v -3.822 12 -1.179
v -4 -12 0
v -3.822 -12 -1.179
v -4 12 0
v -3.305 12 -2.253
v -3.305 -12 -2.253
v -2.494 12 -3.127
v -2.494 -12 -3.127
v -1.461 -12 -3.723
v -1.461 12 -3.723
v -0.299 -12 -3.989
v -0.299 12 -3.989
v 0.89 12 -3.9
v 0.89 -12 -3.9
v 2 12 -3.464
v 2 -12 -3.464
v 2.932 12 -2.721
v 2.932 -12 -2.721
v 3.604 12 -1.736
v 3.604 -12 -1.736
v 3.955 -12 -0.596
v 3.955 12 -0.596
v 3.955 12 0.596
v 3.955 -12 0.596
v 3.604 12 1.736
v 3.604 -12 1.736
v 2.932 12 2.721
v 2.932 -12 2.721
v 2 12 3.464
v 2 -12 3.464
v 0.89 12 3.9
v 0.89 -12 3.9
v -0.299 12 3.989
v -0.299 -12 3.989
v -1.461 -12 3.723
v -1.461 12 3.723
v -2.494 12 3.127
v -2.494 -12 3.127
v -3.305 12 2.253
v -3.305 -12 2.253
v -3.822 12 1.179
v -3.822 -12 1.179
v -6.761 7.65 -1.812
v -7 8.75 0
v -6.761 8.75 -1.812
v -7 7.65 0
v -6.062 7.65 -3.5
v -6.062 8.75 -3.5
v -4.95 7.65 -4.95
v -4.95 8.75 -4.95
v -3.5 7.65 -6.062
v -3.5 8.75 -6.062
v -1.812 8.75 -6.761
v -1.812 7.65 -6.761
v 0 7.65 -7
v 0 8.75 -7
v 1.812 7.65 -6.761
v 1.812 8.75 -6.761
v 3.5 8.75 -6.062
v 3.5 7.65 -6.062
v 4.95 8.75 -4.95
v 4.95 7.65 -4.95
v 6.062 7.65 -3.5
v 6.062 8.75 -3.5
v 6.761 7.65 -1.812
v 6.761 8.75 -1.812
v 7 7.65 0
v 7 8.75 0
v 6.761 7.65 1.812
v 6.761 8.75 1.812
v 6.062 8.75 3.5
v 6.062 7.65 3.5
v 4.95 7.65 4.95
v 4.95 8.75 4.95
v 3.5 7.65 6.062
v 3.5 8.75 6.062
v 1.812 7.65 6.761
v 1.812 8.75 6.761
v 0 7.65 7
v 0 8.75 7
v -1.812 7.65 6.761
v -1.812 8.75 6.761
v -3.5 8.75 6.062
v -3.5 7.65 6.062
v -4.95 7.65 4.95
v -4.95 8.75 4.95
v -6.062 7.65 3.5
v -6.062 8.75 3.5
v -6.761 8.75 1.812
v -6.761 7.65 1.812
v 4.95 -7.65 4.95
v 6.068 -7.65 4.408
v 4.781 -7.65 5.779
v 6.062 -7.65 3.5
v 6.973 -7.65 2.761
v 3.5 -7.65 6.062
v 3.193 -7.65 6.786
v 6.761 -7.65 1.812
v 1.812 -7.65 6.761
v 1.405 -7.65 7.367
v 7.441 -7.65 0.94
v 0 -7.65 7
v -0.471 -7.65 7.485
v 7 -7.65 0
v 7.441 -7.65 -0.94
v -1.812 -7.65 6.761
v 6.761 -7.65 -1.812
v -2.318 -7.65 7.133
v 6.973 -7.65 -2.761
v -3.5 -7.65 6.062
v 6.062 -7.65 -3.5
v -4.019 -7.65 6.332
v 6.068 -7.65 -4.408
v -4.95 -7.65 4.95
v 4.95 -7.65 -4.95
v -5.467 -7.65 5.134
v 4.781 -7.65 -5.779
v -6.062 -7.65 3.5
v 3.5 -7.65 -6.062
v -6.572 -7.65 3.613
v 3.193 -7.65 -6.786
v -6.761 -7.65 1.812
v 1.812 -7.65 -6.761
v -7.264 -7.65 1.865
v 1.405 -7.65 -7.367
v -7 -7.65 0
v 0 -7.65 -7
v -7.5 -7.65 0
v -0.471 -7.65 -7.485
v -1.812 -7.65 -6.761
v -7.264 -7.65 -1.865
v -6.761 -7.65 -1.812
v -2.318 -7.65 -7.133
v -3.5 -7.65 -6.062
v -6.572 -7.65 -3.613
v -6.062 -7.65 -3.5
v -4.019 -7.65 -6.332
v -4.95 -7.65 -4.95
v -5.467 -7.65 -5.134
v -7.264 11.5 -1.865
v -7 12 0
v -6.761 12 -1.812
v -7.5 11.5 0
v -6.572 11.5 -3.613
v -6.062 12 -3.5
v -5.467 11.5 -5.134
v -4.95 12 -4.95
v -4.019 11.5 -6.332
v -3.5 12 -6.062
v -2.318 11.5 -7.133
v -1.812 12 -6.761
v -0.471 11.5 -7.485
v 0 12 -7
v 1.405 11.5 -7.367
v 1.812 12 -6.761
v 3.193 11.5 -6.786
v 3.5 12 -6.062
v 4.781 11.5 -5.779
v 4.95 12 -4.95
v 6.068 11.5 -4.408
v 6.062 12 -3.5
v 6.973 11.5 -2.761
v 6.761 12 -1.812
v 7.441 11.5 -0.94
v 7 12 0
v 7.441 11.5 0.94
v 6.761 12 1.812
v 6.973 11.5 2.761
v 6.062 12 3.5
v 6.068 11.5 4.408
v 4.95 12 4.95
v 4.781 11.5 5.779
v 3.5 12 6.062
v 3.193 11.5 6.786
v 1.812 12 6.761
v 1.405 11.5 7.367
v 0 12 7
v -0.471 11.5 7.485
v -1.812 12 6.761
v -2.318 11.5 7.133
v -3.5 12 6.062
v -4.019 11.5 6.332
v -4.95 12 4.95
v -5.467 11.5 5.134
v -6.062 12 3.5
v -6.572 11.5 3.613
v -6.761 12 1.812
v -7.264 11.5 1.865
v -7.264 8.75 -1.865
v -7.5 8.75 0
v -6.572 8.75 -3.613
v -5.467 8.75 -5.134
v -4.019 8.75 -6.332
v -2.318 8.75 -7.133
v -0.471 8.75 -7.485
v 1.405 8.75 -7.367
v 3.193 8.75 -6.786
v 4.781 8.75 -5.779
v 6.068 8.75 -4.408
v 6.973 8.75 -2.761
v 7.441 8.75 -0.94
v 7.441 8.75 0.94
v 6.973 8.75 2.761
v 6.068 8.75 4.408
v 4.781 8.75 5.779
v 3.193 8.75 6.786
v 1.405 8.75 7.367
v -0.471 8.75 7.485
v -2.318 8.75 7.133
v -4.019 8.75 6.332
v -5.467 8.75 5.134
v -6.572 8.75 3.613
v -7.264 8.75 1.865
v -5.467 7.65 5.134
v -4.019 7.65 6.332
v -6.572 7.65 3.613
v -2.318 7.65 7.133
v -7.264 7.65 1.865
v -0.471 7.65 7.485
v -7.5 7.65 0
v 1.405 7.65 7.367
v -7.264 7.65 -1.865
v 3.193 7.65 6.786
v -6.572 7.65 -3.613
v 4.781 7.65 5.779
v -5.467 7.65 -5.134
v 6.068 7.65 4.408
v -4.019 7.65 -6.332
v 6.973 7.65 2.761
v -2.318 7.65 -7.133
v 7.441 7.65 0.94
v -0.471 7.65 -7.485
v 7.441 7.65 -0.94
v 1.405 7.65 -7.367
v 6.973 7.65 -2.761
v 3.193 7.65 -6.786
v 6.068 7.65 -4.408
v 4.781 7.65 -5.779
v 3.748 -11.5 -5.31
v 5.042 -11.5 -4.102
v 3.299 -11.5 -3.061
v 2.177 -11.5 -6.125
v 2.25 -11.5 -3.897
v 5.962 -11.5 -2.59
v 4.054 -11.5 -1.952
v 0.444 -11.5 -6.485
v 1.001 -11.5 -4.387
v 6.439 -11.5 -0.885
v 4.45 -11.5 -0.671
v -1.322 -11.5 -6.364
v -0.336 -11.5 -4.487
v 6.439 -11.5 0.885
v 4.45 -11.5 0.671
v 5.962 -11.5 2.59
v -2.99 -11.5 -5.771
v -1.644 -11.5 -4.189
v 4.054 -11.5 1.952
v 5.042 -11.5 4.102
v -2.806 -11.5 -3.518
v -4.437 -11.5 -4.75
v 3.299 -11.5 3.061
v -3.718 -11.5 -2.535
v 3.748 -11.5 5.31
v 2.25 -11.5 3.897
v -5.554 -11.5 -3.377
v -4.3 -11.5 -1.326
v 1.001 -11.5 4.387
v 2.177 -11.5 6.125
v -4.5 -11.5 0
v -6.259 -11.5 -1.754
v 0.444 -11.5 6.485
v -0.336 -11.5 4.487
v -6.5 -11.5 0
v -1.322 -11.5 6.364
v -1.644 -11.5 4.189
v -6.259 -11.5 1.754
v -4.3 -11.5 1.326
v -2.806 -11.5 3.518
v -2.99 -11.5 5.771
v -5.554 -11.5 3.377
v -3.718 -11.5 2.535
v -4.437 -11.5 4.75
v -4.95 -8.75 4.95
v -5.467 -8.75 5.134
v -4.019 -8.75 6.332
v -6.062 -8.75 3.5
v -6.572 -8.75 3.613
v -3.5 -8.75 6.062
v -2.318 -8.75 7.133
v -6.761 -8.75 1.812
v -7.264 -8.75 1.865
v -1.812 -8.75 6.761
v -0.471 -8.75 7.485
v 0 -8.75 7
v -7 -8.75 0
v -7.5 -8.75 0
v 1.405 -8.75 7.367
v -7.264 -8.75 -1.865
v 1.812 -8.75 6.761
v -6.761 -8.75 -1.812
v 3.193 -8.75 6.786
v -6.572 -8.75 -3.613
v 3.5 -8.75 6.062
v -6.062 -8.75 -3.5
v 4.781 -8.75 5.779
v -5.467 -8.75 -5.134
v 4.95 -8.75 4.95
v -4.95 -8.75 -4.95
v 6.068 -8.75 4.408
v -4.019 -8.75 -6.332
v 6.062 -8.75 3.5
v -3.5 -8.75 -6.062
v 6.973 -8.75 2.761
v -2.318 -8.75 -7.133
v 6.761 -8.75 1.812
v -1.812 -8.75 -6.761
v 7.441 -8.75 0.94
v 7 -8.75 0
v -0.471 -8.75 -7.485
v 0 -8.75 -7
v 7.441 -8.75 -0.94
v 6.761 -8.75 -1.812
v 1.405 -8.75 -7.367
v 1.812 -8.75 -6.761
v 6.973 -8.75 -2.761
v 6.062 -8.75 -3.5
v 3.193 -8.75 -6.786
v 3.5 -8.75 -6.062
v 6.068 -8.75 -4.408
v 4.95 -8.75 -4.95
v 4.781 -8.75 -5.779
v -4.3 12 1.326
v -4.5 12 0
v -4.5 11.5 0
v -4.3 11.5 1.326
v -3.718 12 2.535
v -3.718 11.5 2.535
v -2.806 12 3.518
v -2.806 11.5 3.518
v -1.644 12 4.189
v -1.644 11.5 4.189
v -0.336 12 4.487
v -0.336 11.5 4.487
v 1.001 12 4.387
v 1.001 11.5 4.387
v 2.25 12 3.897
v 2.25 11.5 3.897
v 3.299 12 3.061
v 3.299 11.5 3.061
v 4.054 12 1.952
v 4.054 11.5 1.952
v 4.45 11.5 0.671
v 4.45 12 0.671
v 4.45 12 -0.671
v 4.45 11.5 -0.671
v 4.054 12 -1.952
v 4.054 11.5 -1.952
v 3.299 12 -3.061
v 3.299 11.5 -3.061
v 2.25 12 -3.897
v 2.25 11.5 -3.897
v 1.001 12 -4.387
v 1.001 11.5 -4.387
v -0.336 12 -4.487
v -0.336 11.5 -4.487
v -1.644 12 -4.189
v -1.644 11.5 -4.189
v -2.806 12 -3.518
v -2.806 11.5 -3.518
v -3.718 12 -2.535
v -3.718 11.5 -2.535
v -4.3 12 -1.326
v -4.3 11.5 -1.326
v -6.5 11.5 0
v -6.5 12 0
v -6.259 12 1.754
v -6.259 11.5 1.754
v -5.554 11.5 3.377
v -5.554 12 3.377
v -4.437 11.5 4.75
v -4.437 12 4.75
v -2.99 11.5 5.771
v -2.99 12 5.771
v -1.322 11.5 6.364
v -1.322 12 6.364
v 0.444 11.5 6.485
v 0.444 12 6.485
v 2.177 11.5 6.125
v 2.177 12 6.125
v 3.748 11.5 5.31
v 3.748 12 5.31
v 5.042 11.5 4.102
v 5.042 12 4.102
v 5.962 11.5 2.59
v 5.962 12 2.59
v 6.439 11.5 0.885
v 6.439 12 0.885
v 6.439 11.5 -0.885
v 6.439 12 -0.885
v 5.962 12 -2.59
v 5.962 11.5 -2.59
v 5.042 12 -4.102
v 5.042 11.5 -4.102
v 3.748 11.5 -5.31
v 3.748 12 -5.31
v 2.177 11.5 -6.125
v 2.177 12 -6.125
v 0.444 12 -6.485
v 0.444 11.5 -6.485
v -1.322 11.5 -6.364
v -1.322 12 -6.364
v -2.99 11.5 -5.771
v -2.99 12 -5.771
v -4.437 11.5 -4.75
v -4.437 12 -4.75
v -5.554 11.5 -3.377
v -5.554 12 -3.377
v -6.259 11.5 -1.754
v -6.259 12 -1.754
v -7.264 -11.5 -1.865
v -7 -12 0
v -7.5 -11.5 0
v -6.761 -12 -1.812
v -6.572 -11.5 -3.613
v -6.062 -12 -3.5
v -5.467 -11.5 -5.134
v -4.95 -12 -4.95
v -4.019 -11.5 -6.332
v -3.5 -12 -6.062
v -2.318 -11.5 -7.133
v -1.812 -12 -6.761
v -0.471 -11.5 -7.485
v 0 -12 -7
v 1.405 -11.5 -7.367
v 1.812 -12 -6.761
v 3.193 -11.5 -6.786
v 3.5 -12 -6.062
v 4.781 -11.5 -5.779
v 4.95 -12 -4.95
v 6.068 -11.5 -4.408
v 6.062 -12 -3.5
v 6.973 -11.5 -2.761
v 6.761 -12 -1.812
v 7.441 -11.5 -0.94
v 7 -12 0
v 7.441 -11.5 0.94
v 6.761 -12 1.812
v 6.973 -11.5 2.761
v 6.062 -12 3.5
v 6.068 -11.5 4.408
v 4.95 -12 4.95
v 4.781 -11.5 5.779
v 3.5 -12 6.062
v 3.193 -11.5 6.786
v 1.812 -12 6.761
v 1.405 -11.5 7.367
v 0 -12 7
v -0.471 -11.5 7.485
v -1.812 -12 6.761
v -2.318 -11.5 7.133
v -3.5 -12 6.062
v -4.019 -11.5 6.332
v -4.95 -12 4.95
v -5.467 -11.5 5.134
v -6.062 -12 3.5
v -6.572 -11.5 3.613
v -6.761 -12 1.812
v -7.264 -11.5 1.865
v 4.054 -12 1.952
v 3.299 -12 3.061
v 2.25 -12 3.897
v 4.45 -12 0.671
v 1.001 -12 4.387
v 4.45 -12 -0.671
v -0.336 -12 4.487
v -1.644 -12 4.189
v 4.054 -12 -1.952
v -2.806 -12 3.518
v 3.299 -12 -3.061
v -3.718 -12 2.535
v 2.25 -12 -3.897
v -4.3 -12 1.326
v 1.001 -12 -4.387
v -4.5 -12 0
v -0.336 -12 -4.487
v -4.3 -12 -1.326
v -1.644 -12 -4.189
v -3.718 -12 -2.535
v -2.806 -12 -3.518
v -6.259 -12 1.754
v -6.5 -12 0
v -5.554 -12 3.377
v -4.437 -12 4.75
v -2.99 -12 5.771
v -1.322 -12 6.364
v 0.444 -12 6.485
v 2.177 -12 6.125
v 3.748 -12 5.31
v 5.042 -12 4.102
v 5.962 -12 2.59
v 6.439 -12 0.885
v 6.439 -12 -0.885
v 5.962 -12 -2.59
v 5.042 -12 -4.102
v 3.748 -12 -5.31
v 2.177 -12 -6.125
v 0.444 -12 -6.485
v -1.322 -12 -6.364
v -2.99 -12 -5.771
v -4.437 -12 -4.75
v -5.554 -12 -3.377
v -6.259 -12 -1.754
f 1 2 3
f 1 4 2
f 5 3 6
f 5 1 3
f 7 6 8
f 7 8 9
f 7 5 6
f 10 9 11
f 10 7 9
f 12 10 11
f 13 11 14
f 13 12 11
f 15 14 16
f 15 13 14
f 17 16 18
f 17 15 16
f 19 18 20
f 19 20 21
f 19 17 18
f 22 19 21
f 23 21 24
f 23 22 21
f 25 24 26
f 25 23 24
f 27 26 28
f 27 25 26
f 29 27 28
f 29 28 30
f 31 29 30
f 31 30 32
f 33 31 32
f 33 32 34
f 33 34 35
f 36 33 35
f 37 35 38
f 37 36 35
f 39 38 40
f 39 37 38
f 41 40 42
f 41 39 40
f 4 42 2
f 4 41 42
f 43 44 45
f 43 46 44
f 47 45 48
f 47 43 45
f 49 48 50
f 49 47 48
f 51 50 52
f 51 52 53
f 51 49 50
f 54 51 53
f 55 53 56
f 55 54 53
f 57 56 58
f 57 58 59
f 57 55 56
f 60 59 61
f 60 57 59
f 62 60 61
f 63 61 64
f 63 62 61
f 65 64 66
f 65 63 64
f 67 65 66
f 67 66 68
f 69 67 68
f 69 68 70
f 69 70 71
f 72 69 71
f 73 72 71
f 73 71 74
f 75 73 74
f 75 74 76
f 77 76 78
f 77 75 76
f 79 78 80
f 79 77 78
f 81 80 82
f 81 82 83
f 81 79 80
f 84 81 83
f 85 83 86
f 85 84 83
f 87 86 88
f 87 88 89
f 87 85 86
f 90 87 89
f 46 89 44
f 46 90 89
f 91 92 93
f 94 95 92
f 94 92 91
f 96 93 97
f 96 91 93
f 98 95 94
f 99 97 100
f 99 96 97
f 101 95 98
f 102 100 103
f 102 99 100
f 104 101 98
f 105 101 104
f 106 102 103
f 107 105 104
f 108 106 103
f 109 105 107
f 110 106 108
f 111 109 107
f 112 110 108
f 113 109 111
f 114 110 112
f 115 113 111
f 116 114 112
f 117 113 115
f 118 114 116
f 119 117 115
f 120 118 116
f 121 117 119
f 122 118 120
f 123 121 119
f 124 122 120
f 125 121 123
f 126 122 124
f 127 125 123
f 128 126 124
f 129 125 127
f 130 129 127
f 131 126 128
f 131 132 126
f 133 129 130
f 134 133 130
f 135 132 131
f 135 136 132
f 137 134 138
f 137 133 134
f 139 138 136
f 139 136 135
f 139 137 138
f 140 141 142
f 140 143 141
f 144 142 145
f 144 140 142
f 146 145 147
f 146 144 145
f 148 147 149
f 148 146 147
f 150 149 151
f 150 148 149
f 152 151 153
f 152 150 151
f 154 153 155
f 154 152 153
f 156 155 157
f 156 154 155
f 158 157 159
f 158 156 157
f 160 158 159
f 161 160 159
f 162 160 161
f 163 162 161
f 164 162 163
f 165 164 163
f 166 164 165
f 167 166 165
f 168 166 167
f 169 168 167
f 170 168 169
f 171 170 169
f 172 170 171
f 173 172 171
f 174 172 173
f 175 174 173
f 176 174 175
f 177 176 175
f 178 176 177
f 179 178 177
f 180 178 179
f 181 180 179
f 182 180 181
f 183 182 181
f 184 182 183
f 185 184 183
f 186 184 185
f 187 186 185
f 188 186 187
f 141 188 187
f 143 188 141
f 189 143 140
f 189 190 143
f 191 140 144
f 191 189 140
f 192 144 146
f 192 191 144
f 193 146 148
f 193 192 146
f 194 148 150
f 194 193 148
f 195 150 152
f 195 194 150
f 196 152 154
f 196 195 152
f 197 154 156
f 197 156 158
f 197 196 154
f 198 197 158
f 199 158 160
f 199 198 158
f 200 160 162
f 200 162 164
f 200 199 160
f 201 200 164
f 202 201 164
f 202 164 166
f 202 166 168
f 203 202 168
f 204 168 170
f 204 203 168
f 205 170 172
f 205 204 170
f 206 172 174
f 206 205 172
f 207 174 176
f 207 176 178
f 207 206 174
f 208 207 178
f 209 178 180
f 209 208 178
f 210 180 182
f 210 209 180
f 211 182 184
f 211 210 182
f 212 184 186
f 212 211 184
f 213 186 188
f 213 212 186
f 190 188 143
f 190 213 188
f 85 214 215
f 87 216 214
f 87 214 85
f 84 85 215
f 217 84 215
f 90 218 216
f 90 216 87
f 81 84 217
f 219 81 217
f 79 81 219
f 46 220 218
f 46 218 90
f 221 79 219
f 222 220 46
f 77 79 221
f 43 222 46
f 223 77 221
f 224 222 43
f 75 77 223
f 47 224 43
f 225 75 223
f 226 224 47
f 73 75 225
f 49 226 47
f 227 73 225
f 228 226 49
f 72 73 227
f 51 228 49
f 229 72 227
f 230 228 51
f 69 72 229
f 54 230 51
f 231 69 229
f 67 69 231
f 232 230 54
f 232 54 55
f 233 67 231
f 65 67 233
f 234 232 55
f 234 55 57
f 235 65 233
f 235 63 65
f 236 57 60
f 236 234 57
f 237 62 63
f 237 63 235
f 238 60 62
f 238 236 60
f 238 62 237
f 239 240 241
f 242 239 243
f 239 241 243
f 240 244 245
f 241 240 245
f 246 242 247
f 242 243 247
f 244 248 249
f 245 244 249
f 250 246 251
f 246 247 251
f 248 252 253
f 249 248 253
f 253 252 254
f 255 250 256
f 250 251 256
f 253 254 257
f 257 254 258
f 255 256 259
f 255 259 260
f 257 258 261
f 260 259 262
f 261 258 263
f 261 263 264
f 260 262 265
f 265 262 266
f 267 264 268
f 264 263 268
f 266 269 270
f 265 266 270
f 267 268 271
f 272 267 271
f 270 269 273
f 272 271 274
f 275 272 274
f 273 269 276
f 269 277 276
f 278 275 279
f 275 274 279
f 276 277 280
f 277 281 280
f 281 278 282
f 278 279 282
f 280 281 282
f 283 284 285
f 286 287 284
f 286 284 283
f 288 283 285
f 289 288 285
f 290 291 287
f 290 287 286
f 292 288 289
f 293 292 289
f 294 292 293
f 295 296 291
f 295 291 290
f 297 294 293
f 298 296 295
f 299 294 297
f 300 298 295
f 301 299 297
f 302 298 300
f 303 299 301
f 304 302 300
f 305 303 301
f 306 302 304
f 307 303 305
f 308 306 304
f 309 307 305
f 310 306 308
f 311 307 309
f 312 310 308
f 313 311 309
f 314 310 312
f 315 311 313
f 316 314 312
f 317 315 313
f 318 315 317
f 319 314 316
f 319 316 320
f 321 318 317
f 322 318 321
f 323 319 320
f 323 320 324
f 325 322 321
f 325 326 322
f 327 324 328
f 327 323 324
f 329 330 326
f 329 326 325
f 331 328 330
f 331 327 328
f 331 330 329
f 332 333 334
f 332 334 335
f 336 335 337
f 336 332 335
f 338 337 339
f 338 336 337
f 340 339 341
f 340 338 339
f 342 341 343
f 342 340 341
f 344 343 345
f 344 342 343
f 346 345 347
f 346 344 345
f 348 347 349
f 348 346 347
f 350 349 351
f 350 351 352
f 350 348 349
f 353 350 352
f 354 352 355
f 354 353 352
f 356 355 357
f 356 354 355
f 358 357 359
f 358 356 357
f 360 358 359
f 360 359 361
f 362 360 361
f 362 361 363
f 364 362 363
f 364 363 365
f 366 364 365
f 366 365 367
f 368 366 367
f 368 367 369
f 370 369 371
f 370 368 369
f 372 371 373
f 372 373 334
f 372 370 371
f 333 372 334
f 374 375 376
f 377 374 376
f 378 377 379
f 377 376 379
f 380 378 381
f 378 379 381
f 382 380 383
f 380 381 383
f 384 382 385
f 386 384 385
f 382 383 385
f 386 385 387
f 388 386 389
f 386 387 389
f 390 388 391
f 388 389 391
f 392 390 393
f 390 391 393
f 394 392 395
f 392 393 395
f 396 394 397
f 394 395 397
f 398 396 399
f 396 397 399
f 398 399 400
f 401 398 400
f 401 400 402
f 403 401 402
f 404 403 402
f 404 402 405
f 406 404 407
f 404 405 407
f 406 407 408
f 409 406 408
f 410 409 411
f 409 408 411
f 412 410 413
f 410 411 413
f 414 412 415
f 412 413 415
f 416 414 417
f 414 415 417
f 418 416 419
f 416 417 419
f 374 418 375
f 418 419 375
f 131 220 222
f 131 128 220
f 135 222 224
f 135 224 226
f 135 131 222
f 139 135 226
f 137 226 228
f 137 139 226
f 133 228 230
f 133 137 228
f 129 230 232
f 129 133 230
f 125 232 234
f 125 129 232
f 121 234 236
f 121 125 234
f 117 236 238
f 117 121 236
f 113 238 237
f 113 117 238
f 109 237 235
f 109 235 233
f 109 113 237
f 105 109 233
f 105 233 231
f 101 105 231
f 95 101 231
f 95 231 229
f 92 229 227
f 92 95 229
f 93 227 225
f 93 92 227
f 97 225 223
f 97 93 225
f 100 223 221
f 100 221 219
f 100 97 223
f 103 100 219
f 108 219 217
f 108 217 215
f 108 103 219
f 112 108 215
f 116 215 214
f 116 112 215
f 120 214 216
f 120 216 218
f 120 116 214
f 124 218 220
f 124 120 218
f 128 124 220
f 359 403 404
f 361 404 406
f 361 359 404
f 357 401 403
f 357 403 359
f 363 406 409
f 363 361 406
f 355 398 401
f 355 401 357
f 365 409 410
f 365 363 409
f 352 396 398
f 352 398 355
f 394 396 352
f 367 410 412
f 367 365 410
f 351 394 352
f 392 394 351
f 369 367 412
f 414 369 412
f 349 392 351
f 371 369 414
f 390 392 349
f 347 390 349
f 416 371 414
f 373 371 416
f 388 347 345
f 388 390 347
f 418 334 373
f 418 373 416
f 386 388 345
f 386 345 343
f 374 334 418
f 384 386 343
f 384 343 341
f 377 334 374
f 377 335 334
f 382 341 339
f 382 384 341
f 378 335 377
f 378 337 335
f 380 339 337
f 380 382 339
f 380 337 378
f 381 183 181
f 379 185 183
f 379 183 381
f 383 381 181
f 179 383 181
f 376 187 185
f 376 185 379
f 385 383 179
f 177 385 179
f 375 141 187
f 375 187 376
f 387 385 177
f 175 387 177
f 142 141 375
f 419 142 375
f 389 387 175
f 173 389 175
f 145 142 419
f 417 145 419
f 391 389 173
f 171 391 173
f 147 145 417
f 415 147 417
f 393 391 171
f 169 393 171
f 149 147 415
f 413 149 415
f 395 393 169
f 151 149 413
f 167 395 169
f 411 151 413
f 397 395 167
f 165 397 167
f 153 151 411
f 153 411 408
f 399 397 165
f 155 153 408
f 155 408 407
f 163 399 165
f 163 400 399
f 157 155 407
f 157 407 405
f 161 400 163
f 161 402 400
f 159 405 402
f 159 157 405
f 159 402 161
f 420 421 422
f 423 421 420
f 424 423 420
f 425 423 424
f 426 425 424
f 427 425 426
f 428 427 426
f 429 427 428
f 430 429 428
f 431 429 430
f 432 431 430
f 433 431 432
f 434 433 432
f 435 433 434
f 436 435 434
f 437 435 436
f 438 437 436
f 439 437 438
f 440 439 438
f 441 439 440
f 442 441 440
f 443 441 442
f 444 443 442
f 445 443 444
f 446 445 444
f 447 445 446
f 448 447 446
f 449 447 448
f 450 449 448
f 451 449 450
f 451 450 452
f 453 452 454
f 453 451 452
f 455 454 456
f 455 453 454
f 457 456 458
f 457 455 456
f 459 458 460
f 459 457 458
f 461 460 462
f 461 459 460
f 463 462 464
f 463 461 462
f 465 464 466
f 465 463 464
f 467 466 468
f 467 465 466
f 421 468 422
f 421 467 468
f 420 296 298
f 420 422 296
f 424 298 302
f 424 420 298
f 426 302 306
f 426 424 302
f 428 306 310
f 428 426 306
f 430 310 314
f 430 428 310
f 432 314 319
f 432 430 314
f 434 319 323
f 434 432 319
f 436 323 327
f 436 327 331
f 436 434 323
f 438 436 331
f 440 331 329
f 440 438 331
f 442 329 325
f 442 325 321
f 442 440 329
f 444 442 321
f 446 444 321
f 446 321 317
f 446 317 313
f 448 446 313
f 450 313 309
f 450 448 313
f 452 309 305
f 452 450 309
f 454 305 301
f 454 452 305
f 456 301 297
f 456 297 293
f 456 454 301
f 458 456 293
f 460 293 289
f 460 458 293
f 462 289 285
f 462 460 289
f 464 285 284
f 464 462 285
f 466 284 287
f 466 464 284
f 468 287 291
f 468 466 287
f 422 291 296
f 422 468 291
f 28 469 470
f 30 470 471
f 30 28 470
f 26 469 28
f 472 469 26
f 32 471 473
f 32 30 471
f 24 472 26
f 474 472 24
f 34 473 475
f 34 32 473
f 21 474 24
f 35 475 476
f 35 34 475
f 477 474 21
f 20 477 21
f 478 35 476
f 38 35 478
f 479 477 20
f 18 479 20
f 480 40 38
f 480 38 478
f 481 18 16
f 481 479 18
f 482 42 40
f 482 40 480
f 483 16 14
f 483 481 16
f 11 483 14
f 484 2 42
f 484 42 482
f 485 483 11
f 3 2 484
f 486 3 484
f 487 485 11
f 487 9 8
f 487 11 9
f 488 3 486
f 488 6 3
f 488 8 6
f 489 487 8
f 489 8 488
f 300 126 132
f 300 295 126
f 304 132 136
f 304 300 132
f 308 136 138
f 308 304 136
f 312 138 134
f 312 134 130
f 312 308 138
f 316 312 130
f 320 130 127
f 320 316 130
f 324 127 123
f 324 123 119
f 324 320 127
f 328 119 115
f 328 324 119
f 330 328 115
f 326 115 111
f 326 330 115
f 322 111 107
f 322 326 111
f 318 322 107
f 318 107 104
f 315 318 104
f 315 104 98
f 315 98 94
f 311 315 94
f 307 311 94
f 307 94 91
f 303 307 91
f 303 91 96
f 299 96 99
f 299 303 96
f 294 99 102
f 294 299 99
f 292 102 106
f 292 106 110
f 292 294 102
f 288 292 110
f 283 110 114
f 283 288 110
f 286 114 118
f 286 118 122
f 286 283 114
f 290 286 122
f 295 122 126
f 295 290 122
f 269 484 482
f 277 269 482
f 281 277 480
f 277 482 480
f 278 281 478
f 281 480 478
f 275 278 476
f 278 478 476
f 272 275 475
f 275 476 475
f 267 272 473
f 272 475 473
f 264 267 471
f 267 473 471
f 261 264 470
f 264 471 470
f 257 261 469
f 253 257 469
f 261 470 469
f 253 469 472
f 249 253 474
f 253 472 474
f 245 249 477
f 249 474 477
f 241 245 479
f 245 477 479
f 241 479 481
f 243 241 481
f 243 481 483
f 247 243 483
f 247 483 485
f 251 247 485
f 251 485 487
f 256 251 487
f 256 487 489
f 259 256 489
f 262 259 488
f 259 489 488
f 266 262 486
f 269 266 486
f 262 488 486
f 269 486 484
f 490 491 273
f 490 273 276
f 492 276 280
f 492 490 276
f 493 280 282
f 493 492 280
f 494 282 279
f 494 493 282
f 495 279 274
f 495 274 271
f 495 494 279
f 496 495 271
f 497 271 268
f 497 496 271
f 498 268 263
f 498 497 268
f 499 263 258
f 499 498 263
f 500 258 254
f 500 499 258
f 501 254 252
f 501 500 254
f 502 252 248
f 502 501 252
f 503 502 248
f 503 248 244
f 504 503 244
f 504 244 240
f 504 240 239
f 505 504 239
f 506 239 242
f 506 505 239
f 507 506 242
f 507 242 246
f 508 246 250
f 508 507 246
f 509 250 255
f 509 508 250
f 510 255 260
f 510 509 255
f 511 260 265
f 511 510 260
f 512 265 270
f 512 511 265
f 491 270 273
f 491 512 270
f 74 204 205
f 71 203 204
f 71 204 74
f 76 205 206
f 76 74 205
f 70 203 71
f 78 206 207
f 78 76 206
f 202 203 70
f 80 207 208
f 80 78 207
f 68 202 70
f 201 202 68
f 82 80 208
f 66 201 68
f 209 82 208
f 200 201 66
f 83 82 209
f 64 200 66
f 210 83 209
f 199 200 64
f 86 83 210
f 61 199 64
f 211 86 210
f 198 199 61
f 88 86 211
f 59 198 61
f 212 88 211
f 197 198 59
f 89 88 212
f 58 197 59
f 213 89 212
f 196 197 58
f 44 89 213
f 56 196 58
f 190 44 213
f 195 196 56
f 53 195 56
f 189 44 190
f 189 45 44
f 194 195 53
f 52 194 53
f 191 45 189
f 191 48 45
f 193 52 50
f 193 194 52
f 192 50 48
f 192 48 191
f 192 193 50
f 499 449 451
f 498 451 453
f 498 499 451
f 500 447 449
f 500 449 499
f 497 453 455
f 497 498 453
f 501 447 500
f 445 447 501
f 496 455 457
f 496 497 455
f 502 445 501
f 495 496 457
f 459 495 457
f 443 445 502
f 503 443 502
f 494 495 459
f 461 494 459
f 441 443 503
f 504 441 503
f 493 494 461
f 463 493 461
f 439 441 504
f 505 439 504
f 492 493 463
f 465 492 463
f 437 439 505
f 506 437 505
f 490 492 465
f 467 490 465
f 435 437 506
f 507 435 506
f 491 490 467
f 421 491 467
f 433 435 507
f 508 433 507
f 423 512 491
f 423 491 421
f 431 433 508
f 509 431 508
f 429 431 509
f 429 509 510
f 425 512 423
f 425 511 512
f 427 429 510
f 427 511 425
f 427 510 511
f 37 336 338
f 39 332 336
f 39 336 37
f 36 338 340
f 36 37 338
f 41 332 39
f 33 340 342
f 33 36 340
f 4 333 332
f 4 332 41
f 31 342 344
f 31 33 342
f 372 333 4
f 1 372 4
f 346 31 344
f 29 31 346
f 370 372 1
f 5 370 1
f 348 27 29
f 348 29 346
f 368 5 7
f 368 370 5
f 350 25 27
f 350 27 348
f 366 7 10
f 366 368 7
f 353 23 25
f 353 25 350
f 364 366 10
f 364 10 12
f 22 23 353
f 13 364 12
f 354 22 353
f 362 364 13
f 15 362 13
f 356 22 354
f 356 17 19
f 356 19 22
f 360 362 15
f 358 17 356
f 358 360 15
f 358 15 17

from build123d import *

# Parameters (mm, degrees)
SKETCH2_R          = 6.5
SKETCH2_R_2        = 4.5
CUT_EXTRUDE1_DEPTH = 0.5


with BuildPart() as part:
    # Sketch1 → Revolve1 (revolve)
    with BuildSketch(Plane.XY, mode=Mode.PRIVATE) as revolve1_sk:
        Polygon((4, -12), (4, 12), (7, 12), (7.5, 11.5), (7.5, 8.75), (7, 8.75), (7, 7.65), (7.5, 7.65), (7.5, -7.65), (7, -7.65), (7, -8.75), (7.5, -8.75), (7.5, -11.5), (7, -12), align=None)
    revolve(revolve1_sk.sketch.rotate(Axis((0, 12, 0), (0, -1, 0)), 180), axis=Axis((0, 12, 0), (0, -1, 0)))

    # Sketch2 → Cut-Extrude1 (cut)
    with BuildSketch(Plane(origin=(0, 12, 0), x_dir=(1, 0, 0), z_dir=(0, 1, 0))):
        with Locations(Location((0, 0, 0), (0, 0, 180))):
            Circle(SKETCH2_R)
        with Locations(Location((0, 0, 0), (0, 0, 180))):
            Circle(SKETCH2_R_2, mode=Mode.SUBTRACT)
    cut_extrude1 = extrude(amount=-CUT_EXTRUDE1_DEPTH, mode=Mode.SUBTRACT)

    # Mirror1: Cut-Extrude1 across plane
    add(cut_extrude1.mirror(Plane.ZX), mode=Mode.SUBTRACT)


solid = part.part
